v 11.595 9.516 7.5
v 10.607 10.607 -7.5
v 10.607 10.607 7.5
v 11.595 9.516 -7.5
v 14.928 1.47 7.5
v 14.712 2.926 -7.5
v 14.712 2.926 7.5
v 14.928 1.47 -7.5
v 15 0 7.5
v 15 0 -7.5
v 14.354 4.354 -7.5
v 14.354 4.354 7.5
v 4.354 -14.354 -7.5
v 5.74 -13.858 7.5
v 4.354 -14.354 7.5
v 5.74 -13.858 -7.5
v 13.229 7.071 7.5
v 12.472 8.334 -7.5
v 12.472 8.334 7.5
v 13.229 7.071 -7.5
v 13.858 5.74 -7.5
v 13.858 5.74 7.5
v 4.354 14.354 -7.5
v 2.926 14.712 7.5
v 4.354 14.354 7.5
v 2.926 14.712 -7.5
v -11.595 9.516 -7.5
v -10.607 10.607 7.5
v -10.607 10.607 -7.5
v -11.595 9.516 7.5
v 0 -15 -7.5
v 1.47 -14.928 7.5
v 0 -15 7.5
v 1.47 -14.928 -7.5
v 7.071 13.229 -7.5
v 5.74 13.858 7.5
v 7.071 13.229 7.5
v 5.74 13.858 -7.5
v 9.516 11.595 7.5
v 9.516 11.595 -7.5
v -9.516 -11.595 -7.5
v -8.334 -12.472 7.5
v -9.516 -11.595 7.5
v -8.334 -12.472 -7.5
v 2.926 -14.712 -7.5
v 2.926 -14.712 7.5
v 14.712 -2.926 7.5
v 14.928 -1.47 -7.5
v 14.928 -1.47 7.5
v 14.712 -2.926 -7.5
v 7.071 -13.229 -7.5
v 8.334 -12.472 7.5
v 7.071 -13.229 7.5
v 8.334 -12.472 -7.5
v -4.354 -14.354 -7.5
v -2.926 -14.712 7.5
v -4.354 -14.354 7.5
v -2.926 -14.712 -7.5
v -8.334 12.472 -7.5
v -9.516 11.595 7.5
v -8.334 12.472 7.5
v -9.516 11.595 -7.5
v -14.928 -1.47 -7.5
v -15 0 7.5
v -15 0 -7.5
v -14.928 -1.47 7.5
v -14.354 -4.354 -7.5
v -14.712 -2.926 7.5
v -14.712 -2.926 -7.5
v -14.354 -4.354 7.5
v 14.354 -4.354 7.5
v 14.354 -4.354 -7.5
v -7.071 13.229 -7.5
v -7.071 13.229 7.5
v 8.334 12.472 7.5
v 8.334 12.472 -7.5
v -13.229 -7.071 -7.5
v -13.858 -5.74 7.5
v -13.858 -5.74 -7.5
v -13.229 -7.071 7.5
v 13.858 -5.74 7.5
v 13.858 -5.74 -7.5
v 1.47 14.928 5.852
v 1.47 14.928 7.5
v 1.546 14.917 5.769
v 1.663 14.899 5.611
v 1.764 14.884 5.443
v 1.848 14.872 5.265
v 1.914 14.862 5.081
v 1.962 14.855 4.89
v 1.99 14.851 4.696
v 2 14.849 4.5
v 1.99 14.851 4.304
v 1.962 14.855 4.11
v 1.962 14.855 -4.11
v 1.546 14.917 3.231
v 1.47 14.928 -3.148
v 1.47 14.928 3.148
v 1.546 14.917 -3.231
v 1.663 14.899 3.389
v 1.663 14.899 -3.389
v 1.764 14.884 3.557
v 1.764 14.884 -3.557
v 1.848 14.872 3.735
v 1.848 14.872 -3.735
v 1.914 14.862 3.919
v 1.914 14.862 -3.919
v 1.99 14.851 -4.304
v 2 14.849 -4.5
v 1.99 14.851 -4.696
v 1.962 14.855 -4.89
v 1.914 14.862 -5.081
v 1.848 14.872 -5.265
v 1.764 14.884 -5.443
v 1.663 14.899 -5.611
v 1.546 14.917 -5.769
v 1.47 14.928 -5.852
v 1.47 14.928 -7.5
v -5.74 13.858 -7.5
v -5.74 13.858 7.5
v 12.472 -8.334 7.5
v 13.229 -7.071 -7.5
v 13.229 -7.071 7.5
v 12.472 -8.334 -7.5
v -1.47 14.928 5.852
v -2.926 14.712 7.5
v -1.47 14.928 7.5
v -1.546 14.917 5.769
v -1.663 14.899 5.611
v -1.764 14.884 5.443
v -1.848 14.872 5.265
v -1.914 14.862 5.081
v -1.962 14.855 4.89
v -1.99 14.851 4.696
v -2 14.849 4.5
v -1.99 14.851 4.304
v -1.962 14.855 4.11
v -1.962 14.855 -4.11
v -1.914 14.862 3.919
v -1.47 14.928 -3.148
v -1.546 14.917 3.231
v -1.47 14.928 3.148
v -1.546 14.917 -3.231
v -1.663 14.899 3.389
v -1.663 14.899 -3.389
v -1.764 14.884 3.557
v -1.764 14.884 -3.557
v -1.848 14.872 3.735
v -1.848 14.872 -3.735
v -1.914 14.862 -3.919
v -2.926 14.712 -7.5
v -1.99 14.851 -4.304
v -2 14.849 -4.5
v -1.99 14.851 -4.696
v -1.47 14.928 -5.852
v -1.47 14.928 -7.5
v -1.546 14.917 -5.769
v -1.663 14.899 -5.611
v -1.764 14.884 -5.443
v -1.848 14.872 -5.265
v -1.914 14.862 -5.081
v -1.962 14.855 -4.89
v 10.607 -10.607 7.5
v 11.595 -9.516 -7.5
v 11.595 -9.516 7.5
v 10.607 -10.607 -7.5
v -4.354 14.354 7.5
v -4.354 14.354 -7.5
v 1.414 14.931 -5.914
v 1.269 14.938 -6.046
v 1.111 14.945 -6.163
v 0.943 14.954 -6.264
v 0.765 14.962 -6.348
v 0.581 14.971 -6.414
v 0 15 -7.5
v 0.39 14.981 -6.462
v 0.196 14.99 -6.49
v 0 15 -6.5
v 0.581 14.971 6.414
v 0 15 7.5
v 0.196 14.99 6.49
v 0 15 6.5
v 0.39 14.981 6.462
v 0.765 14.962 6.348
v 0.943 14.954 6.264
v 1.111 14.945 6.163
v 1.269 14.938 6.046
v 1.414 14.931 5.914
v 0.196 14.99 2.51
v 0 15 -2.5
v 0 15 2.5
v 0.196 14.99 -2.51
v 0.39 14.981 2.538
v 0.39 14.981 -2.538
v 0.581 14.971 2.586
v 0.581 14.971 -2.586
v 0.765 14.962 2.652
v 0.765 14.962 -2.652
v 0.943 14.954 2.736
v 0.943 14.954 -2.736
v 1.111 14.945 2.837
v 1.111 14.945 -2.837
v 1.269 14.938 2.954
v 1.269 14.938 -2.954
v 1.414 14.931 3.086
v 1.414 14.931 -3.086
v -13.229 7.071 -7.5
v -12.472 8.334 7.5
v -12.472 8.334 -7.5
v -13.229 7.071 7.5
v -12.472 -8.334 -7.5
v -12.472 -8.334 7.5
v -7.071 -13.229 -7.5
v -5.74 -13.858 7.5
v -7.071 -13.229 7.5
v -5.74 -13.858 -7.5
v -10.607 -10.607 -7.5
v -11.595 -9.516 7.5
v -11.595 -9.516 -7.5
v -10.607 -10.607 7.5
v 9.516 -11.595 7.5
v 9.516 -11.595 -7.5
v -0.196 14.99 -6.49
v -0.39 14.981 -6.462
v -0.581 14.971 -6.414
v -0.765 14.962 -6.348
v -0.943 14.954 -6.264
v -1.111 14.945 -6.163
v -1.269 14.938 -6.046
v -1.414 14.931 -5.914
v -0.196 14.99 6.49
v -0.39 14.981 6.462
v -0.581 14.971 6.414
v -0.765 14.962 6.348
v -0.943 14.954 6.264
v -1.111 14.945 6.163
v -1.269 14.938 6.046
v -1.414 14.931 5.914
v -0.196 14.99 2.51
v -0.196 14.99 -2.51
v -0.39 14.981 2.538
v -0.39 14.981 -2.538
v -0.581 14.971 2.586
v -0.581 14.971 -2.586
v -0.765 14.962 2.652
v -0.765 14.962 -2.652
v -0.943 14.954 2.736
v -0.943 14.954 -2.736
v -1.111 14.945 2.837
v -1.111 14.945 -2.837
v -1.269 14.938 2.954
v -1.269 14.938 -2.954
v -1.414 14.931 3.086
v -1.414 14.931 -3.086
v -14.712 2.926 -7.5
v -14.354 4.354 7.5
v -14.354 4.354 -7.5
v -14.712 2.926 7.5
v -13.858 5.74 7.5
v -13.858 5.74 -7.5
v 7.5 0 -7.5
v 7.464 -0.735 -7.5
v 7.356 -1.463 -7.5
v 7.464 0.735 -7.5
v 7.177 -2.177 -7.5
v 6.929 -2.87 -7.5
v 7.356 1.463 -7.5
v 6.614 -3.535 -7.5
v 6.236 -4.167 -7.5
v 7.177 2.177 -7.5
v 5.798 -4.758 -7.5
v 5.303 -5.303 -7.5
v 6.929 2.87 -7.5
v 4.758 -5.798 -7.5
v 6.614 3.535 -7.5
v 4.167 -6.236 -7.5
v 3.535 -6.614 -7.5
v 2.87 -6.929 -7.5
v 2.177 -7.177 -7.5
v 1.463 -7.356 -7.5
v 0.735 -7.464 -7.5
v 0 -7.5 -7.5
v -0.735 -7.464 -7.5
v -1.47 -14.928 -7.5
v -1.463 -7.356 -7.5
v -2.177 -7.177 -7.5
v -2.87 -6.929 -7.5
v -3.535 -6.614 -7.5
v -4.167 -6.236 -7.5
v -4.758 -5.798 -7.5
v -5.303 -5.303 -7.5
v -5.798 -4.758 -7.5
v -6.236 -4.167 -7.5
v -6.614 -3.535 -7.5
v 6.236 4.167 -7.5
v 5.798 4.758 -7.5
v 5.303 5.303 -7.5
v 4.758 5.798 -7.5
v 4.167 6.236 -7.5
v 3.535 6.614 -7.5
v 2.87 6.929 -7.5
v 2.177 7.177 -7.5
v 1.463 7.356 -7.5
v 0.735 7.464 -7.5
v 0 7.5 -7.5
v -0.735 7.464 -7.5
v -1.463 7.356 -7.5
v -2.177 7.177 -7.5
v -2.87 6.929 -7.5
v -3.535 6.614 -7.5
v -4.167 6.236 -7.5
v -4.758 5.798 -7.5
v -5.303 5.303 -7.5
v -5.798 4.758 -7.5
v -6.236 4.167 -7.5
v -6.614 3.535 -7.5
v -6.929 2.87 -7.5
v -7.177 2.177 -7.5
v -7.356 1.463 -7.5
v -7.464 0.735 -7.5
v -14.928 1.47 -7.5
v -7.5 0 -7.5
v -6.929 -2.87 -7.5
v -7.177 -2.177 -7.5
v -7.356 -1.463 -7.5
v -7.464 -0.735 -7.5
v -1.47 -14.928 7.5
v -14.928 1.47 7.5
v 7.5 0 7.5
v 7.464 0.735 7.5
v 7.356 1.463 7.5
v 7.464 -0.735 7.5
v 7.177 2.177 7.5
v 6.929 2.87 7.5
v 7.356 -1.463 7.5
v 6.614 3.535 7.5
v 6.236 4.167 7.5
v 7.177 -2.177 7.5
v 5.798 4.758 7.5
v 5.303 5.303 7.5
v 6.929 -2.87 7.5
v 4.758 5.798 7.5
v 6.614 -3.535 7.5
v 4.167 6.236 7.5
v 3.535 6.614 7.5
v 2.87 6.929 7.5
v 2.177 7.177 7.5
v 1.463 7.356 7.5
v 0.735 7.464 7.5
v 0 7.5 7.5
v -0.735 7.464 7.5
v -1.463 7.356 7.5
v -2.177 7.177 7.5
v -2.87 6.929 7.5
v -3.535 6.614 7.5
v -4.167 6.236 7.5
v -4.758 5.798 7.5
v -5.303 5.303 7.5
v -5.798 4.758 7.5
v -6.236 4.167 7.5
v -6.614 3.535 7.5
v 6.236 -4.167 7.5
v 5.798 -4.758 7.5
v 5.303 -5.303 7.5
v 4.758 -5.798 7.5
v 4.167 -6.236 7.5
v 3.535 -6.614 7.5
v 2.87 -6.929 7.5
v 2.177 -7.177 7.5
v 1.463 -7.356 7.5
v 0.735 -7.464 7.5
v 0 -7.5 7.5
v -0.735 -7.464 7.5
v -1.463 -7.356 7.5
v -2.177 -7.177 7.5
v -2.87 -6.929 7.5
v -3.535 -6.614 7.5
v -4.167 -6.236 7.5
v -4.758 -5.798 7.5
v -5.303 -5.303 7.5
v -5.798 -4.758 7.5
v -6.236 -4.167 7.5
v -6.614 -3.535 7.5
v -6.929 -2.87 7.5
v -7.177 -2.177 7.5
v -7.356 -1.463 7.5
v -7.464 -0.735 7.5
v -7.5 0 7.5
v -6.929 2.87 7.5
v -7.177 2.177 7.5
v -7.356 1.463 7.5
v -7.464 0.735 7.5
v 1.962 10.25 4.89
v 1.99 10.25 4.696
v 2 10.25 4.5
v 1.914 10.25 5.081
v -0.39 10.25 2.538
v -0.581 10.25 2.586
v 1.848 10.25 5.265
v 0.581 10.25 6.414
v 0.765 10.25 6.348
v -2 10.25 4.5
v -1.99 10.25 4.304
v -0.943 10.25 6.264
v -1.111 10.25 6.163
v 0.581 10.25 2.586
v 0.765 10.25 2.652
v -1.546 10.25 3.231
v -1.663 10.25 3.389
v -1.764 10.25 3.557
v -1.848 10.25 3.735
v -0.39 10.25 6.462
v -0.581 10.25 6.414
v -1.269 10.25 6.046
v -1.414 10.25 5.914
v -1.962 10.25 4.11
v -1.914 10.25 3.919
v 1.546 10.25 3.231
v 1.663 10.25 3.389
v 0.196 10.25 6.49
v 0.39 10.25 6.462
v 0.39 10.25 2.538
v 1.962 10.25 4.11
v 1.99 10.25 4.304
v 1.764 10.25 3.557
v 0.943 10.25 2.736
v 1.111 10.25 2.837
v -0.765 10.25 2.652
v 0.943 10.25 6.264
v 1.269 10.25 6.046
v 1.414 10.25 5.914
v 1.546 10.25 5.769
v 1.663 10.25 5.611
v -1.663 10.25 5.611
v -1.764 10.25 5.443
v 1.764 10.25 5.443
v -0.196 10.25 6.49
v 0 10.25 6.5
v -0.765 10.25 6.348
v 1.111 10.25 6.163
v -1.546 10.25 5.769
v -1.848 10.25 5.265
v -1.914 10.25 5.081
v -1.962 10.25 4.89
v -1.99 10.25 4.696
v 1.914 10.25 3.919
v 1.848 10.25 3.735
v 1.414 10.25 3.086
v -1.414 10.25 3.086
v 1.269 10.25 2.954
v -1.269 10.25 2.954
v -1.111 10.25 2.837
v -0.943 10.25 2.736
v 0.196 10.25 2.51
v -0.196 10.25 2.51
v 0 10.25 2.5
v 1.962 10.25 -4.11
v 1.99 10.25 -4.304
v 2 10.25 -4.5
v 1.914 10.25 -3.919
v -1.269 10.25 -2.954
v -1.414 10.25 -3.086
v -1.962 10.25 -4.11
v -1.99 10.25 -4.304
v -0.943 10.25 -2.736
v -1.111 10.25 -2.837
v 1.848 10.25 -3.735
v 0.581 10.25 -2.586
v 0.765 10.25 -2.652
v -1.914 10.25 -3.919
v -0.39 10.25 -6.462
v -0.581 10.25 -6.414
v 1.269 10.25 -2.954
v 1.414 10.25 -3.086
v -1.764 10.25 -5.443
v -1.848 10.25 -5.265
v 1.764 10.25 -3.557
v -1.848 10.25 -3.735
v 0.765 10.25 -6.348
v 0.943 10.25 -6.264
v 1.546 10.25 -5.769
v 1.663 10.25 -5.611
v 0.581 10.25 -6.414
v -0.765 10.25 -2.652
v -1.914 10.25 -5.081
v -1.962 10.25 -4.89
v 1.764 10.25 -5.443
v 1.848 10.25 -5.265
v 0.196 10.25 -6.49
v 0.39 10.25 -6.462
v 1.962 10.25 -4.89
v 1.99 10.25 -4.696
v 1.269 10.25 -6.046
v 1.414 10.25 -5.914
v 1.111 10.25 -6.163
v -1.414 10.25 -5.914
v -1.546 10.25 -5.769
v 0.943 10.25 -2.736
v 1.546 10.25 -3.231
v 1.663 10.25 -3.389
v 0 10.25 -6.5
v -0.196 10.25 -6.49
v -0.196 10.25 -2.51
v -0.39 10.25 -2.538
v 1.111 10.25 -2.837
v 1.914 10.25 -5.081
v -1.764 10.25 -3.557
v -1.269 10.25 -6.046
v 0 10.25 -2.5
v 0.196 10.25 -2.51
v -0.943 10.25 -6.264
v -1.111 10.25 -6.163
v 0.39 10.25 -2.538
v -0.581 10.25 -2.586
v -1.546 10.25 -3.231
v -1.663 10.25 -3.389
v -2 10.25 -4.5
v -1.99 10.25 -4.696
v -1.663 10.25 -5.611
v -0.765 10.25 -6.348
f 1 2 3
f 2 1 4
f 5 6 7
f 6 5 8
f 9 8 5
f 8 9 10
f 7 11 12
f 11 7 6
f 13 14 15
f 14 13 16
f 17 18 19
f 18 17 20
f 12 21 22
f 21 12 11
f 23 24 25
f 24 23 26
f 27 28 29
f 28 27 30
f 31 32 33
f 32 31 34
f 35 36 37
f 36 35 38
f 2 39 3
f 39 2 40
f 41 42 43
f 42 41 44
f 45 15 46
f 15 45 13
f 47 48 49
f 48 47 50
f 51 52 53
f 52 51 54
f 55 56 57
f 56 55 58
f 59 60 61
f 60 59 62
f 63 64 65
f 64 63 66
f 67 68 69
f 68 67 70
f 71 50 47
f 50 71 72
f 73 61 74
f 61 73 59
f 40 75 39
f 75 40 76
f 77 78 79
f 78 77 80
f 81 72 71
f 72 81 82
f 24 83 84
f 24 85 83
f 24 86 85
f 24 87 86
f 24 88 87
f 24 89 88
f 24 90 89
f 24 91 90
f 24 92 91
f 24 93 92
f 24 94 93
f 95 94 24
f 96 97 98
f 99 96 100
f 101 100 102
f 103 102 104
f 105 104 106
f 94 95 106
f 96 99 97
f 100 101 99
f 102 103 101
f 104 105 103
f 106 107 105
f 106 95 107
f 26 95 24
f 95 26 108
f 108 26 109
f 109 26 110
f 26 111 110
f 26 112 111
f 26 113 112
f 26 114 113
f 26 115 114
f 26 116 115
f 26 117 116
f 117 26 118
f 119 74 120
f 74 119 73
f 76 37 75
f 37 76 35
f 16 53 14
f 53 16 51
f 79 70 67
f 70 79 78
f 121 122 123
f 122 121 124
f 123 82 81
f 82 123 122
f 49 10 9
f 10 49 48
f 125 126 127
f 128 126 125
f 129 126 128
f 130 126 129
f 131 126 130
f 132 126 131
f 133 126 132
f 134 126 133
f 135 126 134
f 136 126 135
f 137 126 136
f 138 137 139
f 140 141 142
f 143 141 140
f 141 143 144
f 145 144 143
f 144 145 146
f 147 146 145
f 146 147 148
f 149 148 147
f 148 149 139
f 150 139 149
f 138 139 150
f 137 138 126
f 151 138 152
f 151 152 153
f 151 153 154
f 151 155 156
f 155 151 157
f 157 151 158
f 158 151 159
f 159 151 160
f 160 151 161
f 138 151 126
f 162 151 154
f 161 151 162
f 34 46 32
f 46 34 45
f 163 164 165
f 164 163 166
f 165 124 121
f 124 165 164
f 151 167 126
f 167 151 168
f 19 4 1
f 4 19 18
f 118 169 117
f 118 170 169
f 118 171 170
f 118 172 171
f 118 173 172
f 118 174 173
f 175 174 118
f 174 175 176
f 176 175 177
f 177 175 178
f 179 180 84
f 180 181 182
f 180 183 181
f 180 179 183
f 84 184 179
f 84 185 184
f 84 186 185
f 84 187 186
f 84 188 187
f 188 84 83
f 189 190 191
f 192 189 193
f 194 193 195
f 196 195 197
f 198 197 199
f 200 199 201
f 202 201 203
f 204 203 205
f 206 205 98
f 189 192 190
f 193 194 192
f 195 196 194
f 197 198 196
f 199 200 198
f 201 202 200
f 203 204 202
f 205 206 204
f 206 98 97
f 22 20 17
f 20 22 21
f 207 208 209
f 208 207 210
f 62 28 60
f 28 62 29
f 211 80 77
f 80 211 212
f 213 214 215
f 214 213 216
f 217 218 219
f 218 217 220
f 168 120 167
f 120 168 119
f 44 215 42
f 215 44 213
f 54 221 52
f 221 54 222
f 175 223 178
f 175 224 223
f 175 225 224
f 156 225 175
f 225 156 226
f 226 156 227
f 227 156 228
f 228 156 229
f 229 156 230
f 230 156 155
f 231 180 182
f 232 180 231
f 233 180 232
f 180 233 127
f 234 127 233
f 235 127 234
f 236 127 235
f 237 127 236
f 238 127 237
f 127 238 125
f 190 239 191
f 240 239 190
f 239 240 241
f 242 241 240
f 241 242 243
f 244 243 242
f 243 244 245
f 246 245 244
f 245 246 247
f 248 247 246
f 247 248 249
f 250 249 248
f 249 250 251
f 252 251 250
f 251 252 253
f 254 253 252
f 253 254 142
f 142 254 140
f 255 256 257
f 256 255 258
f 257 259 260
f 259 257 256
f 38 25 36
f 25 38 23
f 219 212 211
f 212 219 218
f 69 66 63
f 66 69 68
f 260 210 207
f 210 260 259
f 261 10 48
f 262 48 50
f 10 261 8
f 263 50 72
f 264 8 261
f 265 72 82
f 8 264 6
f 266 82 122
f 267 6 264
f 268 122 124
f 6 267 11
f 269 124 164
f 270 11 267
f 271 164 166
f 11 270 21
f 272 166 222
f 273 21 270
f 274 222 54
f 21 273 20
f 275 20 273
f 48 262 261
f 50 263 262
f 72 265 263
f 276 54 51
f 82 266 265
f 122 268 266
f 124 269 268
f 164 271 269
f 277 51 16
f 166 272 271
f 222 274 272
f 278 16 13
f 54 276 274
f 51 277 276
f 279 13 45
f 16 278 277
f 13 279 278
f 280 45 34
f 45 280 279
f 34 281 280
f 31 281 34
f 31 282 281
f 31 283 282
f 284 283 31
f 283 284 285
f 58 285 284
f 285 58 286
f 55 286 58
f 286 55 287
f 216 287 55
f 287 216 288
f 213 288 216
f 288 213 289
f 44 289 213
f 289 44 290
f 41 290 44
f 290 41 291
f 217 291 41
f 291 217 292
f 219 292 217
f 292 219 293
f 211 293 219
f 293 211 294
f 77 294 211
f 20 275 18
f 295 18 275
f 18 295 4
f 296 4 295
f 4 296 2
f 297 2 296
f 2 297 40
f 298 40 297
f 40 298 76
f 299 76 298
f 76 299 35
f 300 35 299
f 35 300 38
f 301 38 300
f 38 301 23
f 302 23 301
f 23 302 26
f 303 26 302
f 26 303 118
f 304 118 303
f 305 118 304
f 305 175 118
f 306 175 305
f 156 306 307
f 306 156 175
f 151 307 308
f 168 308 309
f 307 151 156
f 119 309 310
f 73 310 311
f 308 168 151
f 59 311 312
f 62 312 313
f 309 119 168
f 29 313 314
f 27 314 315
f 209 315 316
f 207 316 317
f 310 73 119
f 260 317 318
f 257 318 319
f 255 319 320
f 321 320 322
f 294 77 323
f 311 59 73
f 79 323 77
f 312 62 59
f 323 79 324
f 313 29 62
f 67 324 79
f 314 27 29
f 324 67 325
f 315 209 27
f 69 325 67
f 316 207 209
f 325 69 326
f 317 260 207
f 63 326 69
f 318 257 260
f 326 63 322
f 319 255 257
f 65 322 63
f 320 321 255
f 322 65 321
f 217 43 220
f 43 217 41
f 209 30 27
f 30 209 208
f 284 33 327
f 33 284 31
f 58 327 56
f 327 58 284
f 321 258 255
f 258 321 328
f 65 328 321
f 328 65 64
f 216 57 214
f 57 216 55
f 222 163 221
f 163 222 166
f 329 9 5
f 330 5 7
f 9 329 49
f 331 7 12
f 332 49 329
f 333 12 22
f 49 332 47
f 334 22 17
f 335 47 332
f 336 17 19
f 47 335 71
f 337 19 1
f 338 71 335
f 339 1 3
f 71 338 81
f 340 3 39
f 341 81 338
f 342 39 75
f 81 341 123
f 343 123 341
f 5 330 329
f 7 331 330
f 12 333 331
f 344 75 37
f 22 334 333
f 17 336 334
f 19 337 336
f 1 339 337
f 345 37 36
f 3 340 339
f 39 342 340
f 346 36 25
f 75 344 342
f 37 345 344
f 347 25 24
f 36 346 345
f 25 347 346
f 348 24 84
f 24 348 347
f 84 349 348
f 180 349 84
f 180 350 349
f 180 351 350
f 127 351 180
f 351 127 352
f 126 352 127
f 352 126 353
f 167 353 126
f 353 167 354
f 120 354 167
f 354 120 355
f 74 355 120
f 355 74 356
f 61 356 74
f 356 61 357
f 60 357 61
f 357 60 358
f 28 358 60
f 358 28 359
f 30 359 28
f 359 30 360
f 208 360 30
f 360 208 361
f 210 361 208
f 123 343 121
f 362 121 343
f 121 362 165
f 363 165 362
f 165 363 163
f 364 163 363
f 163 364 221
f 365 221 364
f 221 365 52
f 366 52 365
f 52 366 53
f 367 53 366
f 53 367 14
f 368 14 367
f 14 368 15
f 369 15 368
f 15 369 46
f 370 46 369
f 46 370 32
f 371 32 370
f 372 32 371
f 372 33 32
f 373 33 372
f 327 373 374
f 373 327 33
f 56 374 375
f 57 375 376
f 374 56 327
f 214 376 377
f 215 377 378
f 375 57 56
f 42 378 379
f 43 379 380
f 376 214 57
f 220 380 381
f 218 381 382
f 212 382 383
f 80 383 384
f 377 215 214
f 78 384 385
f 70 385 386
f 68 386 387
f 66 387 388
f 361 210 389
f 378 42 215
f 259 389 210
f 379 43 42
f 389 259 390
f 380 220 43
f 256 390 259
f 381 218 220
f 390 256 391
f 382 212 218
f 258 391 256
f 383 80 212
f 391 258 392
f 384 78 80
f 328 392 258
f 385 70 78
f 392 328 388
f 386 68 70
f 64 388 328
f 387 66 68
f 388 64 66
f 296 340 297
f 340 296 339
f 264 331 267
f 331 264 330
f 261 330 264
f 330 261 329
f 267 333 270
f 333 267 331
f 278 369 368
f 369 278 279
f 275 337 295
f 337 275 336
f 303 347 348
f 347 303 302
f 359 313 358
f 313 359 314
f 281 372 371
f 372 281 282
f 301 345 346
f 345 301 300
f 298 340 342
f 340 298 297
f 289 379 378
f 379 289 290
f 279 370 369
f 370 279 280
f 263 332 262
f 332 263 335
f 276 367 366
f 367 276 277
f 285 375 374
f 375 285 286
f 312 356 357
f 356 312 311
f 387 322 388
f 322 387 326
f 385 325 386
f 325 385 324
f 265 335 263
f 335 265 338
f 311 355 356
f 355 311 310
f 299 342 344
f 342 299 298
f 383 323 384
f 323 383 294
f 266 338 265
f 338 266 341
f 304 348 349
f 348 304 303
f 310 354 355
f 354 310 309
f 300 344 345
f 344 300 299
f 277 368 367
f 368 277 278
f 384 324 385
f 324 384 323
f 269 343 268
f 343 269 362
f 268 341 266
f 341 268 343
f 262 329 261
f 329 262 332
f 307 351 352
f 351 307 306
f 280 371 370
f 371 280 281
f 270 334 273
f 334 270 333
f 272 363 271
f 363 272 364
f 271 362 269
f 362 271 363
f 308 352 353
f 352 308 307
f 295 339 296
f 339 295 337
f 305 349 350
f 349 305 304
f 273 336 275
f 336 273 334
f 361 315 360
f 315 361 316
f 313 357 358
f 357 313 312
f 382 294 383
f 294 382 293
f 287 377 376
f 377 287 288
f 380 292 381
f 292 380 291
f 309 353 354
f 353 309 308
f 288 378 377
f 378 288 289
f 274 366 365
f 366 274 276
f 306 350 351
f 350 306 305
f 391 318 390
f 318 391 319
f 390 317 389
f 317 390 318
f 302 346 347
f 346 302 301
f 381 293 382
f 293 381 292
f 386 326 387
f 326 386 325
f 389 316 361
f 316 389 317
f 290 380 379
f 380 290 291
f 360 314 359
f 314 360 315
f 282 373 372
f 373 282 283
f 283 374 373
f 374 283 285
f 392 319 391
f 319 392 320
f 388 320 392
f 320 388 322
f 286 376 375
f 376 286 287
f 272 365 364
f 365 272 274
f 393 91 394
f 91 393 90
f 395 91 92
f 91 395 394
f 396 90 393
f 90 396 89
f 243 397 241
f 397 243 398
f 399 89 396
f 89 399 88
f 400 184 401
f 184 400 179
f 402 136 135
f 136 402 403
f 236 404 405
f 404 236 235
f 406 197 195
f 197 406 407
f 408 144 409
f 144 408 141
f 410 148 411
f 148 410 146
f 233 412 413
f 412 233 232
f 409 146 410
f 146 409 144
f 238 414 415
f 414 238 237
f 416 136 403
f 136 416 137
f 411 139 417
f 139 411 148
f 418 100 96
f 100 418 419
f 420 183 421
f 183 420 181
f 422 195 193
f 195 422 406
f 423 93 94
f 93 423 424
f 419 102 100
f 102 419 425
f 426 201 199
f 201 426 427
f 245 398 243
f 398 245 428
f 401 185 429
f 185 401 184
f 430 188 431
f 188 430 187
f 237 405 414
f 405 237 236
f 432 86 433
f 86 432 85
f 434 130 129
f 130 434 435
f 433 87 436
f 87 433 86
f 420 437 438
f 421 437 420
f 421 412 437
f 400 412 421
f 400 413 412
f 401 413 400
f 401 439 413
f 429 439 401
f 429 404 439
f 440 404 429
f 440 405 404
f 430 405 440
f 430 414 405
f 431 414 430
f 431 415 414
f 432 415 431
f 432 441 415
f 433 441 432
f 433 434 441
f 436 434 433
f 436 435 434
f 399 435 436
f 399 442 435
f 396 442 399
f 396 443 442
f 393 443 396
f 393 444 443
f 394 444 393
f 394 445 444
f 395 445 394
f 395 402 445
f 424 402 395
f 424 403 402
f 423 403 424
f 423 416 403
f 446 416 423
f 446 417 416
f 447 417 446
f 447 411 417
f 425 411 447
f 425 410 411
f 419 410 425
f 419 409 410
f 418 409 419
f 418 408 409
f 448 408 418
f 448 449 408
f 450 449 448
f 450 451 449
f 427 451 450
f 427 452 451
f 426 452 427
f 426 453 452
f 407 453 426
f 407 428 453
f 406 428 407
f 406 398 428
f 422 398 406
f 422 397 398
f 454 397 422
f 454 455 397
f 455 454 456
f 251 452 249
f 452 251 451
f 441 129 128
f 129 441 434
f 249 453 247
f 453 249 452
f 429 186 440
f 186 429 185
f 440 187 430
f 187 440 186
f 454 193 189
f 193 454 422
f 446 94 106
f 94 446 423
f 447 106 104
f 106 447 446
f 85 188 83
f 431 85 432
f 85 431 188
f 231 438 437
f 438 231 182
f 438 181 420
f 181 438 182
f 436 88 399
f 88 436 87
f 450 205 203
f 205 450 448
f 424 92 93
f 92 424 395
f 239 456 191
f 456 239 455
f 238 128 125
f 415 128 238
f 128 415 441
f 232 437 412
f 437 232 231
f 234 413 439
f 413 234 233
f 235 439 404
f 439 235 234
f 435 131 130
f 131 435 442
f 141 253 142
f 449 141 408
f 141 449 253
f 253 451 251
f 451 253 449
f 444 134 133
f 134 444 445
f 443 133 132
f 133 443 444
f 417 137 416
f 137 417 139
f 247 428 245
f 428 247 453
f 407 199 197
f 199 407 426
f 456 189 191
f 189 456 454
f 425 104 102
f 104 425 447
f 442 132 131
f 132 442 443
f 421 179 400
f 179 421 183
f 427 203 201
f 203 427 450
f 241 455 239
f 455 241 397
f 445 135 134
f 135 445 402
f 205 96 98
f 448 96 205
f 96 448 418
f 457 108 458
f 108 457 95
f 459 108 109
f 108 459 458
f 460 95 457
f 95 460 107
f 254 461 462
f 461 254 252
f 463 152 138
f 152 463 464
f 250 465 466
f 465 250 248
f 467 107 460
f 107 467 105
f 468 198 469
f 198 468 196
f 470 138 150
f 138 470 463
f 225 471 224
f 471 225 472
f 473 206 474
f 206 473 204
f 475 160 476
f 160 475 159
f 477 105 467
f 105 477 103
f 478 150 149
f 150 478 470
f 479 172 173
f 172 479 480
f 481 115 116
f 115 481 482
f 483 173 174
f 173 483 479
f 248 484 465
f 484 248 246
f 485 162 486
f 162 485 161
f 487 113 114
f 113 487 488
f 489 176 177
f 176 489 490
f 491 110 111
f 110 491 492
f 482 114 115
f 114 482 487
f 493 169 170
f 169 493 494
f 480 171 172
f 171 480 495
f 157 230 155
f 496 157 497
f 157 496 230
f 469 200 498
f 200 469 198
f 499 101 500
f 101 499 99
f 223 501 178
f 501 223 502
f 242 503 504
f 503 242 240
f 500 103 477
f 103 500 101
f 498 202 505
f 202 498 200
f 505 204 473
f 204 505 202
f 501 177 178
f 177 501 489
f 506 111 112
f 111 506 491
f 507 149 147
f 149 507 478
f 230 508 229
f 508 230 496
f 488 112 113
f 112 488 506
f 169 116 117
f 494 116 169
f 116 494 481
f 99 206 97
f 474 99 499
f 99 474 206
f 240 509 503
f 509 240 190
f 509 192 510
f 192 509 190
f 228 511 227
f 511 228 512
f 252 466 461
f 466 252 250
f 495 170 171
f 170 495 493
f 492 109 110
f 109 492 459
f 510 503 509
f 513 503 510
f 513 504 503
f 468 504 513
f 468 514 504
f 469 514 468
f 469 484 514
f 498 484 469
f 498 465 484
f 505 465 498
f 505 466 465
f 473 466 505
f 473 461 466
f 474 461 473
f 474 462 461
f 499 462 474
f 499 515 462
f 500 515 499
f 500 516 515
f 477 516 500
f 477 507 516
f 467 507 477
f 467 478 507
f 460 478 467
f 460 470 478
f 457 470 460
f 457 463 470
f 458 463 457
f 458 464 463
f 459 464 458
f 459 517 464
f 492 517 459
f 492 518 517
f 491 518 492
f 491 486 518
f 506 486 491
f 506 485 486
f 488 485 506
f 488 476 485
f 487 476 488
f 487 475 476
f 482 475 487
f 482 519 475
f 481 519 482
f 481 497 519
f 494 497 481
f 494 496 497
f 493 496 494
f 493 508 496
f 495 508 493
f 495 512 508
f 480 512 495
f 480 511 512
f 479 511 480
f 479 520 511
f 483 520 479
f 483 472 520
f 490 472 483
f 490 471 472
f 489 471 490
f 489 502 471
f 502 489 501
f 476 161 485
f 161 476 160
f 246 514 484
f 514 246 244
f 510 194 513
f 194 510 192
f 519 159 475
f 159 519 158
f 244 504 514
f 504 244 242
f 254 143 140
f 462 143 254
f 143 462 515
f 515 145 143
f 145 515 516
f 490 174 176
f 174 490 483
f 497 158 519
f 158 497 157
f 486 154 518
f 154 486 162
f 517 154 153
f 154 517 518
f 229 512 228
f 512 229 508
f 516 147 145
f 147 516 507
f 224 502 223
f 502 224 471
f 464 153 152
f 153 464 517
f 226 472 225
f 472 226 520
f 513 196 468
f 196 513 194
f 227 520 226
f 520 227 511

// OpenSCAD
// COBRA Vertebra - C4 V3
// Height: 15.0mm, OD: 30.0mm

$fn = 64;

difference() {
    // Outer cylinder
    cylinder(h=15.0, d=30.0, center=true);
    
    // Inner channel
    cylinder(h=17.0, d=15.0, center=true);

    // Pivot holes
    translate([0, 15.0, 4.5])
    rotate([90, 0, 0])
    cylinder(h=9.5, d=4, center=true);
    
    translate([0, 15.0, -4.5])
    rotate([90, 0, 0])
    cylinder(h=9.5, d=4, center=true);
}
